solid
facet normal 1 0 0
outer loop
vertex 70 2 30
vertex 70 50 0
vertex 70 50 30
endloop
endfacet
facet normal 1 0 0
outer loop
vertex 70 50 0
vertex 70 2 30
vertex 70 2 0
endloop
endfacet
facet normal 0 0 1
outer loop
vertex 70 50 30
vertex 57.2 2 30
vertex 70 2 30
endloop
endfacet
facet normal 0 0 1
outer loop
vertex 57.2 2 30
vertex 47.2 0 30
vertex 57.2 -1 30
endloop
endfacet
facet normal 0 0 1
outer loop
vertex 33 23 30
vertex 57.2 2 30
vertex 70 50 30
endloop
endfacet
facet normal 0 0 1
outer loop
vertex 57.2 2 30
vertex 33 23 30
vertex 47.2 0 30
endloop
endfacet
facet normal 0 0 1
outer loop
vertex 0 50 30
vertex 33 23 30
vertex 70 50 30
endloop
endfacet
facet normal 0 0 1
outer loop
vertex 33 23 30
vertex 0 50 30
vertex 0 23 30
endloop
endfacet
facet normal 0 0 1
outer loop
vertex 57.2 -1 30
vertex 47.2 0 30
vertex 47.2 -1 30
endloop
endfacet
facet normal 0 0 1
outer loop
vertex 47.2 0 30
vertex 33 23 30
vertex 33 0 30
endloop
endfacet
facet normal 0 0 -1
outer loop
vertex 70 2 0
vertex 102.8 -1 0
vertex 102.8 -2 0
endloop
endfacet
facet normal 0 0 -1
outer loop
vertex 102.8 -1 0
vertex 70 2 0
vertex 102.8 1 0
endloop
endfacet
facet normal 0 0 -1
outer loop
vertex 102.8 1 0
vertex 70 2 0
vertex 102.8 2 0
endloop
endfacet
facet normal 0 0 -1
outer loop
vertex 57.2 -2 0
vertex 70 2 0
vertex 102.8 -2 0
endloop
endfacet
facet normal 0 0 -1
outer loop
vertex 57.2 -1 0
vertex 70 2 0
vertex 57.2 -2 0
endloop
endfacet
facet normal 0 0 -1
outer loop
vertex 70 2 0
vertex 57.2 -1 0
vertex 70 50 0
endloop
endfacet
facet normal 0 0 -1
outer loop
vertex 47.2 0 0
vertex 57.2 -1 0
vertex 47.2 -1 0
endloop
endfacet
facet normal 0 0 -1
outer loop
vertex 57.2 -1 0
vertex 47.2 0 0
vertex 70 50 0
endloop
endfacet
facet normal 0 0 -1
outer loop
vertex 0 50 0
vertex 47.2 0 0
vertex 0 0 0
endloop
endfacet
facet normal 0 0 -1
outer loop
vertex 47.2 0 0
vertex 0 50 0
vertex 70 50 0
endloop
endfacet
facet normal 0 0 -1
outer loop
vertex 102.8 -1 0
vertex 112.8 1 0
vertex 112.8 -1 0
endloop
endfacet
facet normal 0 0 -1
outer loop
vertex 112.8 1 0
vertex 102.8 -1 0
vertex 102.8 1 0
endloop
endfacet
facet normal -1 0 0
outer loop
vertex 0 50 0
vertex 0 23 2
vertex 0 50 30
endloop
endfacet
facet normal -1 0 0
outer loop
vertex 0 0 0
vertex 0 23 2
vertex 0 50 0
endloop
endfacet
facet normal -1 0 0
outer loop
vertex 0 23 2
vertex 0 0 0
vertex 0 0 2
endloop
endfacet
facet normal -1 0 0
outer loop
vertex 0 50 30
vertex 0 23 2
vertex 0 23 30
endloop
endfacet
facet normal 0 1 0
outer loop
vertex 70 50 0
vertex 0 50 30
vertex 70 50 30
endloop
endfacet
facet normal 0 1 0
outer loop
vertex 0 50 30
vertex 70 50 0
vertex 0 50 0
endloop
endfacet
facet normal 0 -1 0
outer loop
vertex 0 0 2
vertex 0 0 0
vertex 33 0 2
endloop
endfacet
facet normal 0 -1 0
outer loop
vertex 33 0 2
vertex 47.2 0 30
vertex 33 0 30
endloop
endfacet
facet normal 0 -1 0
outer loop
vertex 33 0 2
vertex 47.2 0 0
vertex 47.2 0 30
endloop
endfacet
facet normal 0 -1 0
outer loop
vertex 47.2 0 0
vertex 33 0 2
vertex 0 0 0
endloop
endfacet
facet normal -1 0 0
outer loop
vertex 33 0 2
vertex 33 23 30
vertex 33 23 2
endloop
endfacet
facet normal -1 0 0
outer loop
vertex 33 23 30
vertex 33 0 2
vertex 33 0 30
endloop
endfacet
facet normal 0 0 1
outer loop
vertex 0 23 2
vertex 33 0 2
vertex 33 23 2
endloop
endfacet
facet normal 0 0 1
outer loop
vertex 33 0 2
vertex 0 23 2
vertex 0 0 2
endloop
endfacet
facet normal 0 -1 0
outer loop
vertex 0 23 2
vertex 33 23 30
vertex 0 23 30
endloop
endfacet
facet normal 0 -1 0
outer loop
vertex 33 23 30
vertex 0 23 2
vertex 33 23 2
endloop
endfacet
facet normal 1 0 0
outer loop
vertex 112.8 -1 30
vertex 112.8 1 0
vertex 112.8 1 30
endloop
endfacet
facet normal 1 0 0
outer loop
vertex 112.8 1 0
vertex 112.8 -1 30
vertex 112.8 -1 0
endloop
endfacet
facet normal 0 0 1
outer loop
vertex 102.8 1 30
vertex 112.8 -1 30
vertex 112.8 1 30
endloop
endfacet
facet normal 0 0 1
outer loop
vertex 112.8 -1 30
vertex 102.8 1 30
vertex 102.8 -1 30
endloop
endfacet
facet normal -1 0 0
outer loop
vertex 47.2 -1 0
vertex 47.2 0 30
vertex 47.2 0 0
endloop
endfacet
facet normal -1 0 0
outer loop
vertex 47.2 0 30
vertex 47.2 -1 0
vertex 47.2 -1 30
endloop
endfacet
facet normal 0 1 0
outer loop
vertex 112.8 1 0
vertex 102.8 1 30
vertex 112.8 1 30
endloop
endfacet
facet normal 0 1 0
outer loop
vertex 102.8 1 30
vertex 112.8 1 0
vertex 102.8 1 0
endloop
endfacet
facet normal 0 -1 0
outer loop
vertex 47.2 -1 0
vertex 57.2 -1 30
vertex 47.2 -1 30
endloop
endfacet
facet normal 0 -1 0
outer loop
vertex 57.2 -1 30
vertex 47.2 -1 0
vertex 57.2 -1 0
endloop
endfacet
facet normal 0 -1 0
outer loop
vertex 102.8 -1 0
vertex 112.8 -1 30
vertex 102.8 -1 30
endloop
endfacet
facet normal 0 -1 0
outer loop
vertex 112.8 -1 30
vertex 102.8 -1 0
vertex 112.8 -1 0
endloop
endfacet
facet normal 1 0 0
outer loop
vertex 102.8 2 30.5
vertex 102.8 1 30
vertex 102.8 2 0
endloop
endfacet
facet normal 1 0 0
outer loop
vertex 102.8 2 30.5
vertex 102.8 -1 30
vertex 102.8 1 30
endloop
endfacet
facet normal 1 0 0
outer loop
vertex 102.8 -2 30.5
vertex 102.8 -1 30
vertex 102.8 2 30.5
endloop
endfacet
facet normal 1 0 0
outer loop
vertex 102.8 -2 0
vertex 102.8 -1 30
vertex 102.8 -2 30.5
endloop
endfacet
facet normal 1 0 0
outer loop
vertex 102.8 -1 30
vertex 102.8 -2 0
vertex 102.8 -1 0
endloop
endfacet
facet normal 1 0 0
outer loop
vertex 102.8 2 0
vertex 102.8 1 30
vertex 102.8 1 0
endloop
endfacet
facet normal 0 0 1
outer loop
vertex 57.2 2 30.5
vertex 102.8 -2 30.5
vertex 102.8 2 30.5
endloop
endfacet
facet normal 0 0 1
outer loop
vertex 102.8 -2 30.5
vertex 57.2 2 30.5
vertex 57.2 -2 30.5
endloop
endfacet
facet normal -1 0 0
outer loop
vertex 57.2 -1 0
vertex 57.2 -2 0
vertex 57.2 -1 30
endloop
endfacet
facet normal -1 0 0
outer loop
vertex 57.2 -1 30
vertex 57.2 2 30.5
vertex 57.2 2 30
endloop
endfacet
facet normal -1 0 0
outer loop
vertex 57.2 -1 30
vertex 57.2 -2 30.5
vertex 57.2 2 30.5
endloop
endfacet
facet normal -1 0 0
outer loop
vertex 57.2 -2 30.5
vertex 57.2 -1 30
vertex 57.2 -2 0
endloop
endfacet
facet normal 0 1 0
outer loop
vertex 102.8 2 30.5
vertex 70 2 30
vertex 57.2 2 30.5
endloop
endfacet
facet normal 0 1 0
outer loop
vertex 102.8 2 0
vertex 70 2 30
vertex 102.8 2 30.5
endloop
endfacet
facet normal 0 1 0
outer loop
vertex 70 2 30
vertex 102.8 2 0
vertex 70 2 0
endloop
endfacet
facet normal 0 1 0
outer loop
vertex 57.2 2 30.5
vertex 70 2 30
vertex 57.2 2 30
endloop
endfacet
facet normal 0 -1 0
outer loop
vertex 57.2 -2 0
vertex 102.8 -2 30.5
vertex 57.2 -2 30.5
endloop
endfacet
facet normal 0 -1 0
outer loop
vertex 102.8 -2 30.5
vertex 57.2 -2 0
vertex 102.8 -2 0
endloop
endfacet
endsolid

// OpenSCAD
// Two-part enclosure for small electronics board (e.g. Arduino-based temp logger)
// Print orientation: both parts on the bed, lid on the +X side, 10 mm gap between them

$fn = 64;

// ---- Part 1: Box ----
box_x      = 70;    // outer size in X
box_y      = 50;    // outer size in Y
box_z      = 30;    // outer size in Z
box_wall   = 2;     // wall thickness (sides and end); open top
box_floor  = 2;     // floor thickness under the board

// ---- Part 2: Lid ----
lip_w      = 65.6;  // outer size of the lip in X
lip_d      = 45.6;  // outer size of the lip in Y
lip_h      = 4;     // lip height (1.5 mm wall + ~2.5 mm overlap into the box)
plate_t    = 2;     // thickness of the lid plate under the lip
eps        = 0.2;   // clearance between lip outer size and box opening

// ---- Layout ----
gap        = 10;    // gap between box and lid on the bed
overlap    = 0.5;   // lip extends this far into the box for a solid union

// Derived
opening_x = box_x - 2 * box_wall;   // 66
opening_y = box_y - 2 * box_wall;   // 46

module box() {
    difference() {
        cube([box_x, box_y, box_z]);
        // open-top cavity, faces exactly at the wall/plateet boundaries
        translate([-opening_x / 2, -opening_y / 2, box_floor])
            cube([opening_x, opening_y, box_z - box_floor]);
    }
}

module lid() {
    union() {
        // base plate
        translate([-lip_w / 2, -plate_t / 2, 0])
            cube([lip_w, plate_t, box_z]);
        // lip with overlap into the box
        translate([-lip_d / 2, -lip_h / 2, 0])
            cube([lip_d, lip_h, box_z + overlap]);
    }
}

// Print both parts side by side in the same file
box();
translate([box_x + gap, 0, 0])
    lid();
